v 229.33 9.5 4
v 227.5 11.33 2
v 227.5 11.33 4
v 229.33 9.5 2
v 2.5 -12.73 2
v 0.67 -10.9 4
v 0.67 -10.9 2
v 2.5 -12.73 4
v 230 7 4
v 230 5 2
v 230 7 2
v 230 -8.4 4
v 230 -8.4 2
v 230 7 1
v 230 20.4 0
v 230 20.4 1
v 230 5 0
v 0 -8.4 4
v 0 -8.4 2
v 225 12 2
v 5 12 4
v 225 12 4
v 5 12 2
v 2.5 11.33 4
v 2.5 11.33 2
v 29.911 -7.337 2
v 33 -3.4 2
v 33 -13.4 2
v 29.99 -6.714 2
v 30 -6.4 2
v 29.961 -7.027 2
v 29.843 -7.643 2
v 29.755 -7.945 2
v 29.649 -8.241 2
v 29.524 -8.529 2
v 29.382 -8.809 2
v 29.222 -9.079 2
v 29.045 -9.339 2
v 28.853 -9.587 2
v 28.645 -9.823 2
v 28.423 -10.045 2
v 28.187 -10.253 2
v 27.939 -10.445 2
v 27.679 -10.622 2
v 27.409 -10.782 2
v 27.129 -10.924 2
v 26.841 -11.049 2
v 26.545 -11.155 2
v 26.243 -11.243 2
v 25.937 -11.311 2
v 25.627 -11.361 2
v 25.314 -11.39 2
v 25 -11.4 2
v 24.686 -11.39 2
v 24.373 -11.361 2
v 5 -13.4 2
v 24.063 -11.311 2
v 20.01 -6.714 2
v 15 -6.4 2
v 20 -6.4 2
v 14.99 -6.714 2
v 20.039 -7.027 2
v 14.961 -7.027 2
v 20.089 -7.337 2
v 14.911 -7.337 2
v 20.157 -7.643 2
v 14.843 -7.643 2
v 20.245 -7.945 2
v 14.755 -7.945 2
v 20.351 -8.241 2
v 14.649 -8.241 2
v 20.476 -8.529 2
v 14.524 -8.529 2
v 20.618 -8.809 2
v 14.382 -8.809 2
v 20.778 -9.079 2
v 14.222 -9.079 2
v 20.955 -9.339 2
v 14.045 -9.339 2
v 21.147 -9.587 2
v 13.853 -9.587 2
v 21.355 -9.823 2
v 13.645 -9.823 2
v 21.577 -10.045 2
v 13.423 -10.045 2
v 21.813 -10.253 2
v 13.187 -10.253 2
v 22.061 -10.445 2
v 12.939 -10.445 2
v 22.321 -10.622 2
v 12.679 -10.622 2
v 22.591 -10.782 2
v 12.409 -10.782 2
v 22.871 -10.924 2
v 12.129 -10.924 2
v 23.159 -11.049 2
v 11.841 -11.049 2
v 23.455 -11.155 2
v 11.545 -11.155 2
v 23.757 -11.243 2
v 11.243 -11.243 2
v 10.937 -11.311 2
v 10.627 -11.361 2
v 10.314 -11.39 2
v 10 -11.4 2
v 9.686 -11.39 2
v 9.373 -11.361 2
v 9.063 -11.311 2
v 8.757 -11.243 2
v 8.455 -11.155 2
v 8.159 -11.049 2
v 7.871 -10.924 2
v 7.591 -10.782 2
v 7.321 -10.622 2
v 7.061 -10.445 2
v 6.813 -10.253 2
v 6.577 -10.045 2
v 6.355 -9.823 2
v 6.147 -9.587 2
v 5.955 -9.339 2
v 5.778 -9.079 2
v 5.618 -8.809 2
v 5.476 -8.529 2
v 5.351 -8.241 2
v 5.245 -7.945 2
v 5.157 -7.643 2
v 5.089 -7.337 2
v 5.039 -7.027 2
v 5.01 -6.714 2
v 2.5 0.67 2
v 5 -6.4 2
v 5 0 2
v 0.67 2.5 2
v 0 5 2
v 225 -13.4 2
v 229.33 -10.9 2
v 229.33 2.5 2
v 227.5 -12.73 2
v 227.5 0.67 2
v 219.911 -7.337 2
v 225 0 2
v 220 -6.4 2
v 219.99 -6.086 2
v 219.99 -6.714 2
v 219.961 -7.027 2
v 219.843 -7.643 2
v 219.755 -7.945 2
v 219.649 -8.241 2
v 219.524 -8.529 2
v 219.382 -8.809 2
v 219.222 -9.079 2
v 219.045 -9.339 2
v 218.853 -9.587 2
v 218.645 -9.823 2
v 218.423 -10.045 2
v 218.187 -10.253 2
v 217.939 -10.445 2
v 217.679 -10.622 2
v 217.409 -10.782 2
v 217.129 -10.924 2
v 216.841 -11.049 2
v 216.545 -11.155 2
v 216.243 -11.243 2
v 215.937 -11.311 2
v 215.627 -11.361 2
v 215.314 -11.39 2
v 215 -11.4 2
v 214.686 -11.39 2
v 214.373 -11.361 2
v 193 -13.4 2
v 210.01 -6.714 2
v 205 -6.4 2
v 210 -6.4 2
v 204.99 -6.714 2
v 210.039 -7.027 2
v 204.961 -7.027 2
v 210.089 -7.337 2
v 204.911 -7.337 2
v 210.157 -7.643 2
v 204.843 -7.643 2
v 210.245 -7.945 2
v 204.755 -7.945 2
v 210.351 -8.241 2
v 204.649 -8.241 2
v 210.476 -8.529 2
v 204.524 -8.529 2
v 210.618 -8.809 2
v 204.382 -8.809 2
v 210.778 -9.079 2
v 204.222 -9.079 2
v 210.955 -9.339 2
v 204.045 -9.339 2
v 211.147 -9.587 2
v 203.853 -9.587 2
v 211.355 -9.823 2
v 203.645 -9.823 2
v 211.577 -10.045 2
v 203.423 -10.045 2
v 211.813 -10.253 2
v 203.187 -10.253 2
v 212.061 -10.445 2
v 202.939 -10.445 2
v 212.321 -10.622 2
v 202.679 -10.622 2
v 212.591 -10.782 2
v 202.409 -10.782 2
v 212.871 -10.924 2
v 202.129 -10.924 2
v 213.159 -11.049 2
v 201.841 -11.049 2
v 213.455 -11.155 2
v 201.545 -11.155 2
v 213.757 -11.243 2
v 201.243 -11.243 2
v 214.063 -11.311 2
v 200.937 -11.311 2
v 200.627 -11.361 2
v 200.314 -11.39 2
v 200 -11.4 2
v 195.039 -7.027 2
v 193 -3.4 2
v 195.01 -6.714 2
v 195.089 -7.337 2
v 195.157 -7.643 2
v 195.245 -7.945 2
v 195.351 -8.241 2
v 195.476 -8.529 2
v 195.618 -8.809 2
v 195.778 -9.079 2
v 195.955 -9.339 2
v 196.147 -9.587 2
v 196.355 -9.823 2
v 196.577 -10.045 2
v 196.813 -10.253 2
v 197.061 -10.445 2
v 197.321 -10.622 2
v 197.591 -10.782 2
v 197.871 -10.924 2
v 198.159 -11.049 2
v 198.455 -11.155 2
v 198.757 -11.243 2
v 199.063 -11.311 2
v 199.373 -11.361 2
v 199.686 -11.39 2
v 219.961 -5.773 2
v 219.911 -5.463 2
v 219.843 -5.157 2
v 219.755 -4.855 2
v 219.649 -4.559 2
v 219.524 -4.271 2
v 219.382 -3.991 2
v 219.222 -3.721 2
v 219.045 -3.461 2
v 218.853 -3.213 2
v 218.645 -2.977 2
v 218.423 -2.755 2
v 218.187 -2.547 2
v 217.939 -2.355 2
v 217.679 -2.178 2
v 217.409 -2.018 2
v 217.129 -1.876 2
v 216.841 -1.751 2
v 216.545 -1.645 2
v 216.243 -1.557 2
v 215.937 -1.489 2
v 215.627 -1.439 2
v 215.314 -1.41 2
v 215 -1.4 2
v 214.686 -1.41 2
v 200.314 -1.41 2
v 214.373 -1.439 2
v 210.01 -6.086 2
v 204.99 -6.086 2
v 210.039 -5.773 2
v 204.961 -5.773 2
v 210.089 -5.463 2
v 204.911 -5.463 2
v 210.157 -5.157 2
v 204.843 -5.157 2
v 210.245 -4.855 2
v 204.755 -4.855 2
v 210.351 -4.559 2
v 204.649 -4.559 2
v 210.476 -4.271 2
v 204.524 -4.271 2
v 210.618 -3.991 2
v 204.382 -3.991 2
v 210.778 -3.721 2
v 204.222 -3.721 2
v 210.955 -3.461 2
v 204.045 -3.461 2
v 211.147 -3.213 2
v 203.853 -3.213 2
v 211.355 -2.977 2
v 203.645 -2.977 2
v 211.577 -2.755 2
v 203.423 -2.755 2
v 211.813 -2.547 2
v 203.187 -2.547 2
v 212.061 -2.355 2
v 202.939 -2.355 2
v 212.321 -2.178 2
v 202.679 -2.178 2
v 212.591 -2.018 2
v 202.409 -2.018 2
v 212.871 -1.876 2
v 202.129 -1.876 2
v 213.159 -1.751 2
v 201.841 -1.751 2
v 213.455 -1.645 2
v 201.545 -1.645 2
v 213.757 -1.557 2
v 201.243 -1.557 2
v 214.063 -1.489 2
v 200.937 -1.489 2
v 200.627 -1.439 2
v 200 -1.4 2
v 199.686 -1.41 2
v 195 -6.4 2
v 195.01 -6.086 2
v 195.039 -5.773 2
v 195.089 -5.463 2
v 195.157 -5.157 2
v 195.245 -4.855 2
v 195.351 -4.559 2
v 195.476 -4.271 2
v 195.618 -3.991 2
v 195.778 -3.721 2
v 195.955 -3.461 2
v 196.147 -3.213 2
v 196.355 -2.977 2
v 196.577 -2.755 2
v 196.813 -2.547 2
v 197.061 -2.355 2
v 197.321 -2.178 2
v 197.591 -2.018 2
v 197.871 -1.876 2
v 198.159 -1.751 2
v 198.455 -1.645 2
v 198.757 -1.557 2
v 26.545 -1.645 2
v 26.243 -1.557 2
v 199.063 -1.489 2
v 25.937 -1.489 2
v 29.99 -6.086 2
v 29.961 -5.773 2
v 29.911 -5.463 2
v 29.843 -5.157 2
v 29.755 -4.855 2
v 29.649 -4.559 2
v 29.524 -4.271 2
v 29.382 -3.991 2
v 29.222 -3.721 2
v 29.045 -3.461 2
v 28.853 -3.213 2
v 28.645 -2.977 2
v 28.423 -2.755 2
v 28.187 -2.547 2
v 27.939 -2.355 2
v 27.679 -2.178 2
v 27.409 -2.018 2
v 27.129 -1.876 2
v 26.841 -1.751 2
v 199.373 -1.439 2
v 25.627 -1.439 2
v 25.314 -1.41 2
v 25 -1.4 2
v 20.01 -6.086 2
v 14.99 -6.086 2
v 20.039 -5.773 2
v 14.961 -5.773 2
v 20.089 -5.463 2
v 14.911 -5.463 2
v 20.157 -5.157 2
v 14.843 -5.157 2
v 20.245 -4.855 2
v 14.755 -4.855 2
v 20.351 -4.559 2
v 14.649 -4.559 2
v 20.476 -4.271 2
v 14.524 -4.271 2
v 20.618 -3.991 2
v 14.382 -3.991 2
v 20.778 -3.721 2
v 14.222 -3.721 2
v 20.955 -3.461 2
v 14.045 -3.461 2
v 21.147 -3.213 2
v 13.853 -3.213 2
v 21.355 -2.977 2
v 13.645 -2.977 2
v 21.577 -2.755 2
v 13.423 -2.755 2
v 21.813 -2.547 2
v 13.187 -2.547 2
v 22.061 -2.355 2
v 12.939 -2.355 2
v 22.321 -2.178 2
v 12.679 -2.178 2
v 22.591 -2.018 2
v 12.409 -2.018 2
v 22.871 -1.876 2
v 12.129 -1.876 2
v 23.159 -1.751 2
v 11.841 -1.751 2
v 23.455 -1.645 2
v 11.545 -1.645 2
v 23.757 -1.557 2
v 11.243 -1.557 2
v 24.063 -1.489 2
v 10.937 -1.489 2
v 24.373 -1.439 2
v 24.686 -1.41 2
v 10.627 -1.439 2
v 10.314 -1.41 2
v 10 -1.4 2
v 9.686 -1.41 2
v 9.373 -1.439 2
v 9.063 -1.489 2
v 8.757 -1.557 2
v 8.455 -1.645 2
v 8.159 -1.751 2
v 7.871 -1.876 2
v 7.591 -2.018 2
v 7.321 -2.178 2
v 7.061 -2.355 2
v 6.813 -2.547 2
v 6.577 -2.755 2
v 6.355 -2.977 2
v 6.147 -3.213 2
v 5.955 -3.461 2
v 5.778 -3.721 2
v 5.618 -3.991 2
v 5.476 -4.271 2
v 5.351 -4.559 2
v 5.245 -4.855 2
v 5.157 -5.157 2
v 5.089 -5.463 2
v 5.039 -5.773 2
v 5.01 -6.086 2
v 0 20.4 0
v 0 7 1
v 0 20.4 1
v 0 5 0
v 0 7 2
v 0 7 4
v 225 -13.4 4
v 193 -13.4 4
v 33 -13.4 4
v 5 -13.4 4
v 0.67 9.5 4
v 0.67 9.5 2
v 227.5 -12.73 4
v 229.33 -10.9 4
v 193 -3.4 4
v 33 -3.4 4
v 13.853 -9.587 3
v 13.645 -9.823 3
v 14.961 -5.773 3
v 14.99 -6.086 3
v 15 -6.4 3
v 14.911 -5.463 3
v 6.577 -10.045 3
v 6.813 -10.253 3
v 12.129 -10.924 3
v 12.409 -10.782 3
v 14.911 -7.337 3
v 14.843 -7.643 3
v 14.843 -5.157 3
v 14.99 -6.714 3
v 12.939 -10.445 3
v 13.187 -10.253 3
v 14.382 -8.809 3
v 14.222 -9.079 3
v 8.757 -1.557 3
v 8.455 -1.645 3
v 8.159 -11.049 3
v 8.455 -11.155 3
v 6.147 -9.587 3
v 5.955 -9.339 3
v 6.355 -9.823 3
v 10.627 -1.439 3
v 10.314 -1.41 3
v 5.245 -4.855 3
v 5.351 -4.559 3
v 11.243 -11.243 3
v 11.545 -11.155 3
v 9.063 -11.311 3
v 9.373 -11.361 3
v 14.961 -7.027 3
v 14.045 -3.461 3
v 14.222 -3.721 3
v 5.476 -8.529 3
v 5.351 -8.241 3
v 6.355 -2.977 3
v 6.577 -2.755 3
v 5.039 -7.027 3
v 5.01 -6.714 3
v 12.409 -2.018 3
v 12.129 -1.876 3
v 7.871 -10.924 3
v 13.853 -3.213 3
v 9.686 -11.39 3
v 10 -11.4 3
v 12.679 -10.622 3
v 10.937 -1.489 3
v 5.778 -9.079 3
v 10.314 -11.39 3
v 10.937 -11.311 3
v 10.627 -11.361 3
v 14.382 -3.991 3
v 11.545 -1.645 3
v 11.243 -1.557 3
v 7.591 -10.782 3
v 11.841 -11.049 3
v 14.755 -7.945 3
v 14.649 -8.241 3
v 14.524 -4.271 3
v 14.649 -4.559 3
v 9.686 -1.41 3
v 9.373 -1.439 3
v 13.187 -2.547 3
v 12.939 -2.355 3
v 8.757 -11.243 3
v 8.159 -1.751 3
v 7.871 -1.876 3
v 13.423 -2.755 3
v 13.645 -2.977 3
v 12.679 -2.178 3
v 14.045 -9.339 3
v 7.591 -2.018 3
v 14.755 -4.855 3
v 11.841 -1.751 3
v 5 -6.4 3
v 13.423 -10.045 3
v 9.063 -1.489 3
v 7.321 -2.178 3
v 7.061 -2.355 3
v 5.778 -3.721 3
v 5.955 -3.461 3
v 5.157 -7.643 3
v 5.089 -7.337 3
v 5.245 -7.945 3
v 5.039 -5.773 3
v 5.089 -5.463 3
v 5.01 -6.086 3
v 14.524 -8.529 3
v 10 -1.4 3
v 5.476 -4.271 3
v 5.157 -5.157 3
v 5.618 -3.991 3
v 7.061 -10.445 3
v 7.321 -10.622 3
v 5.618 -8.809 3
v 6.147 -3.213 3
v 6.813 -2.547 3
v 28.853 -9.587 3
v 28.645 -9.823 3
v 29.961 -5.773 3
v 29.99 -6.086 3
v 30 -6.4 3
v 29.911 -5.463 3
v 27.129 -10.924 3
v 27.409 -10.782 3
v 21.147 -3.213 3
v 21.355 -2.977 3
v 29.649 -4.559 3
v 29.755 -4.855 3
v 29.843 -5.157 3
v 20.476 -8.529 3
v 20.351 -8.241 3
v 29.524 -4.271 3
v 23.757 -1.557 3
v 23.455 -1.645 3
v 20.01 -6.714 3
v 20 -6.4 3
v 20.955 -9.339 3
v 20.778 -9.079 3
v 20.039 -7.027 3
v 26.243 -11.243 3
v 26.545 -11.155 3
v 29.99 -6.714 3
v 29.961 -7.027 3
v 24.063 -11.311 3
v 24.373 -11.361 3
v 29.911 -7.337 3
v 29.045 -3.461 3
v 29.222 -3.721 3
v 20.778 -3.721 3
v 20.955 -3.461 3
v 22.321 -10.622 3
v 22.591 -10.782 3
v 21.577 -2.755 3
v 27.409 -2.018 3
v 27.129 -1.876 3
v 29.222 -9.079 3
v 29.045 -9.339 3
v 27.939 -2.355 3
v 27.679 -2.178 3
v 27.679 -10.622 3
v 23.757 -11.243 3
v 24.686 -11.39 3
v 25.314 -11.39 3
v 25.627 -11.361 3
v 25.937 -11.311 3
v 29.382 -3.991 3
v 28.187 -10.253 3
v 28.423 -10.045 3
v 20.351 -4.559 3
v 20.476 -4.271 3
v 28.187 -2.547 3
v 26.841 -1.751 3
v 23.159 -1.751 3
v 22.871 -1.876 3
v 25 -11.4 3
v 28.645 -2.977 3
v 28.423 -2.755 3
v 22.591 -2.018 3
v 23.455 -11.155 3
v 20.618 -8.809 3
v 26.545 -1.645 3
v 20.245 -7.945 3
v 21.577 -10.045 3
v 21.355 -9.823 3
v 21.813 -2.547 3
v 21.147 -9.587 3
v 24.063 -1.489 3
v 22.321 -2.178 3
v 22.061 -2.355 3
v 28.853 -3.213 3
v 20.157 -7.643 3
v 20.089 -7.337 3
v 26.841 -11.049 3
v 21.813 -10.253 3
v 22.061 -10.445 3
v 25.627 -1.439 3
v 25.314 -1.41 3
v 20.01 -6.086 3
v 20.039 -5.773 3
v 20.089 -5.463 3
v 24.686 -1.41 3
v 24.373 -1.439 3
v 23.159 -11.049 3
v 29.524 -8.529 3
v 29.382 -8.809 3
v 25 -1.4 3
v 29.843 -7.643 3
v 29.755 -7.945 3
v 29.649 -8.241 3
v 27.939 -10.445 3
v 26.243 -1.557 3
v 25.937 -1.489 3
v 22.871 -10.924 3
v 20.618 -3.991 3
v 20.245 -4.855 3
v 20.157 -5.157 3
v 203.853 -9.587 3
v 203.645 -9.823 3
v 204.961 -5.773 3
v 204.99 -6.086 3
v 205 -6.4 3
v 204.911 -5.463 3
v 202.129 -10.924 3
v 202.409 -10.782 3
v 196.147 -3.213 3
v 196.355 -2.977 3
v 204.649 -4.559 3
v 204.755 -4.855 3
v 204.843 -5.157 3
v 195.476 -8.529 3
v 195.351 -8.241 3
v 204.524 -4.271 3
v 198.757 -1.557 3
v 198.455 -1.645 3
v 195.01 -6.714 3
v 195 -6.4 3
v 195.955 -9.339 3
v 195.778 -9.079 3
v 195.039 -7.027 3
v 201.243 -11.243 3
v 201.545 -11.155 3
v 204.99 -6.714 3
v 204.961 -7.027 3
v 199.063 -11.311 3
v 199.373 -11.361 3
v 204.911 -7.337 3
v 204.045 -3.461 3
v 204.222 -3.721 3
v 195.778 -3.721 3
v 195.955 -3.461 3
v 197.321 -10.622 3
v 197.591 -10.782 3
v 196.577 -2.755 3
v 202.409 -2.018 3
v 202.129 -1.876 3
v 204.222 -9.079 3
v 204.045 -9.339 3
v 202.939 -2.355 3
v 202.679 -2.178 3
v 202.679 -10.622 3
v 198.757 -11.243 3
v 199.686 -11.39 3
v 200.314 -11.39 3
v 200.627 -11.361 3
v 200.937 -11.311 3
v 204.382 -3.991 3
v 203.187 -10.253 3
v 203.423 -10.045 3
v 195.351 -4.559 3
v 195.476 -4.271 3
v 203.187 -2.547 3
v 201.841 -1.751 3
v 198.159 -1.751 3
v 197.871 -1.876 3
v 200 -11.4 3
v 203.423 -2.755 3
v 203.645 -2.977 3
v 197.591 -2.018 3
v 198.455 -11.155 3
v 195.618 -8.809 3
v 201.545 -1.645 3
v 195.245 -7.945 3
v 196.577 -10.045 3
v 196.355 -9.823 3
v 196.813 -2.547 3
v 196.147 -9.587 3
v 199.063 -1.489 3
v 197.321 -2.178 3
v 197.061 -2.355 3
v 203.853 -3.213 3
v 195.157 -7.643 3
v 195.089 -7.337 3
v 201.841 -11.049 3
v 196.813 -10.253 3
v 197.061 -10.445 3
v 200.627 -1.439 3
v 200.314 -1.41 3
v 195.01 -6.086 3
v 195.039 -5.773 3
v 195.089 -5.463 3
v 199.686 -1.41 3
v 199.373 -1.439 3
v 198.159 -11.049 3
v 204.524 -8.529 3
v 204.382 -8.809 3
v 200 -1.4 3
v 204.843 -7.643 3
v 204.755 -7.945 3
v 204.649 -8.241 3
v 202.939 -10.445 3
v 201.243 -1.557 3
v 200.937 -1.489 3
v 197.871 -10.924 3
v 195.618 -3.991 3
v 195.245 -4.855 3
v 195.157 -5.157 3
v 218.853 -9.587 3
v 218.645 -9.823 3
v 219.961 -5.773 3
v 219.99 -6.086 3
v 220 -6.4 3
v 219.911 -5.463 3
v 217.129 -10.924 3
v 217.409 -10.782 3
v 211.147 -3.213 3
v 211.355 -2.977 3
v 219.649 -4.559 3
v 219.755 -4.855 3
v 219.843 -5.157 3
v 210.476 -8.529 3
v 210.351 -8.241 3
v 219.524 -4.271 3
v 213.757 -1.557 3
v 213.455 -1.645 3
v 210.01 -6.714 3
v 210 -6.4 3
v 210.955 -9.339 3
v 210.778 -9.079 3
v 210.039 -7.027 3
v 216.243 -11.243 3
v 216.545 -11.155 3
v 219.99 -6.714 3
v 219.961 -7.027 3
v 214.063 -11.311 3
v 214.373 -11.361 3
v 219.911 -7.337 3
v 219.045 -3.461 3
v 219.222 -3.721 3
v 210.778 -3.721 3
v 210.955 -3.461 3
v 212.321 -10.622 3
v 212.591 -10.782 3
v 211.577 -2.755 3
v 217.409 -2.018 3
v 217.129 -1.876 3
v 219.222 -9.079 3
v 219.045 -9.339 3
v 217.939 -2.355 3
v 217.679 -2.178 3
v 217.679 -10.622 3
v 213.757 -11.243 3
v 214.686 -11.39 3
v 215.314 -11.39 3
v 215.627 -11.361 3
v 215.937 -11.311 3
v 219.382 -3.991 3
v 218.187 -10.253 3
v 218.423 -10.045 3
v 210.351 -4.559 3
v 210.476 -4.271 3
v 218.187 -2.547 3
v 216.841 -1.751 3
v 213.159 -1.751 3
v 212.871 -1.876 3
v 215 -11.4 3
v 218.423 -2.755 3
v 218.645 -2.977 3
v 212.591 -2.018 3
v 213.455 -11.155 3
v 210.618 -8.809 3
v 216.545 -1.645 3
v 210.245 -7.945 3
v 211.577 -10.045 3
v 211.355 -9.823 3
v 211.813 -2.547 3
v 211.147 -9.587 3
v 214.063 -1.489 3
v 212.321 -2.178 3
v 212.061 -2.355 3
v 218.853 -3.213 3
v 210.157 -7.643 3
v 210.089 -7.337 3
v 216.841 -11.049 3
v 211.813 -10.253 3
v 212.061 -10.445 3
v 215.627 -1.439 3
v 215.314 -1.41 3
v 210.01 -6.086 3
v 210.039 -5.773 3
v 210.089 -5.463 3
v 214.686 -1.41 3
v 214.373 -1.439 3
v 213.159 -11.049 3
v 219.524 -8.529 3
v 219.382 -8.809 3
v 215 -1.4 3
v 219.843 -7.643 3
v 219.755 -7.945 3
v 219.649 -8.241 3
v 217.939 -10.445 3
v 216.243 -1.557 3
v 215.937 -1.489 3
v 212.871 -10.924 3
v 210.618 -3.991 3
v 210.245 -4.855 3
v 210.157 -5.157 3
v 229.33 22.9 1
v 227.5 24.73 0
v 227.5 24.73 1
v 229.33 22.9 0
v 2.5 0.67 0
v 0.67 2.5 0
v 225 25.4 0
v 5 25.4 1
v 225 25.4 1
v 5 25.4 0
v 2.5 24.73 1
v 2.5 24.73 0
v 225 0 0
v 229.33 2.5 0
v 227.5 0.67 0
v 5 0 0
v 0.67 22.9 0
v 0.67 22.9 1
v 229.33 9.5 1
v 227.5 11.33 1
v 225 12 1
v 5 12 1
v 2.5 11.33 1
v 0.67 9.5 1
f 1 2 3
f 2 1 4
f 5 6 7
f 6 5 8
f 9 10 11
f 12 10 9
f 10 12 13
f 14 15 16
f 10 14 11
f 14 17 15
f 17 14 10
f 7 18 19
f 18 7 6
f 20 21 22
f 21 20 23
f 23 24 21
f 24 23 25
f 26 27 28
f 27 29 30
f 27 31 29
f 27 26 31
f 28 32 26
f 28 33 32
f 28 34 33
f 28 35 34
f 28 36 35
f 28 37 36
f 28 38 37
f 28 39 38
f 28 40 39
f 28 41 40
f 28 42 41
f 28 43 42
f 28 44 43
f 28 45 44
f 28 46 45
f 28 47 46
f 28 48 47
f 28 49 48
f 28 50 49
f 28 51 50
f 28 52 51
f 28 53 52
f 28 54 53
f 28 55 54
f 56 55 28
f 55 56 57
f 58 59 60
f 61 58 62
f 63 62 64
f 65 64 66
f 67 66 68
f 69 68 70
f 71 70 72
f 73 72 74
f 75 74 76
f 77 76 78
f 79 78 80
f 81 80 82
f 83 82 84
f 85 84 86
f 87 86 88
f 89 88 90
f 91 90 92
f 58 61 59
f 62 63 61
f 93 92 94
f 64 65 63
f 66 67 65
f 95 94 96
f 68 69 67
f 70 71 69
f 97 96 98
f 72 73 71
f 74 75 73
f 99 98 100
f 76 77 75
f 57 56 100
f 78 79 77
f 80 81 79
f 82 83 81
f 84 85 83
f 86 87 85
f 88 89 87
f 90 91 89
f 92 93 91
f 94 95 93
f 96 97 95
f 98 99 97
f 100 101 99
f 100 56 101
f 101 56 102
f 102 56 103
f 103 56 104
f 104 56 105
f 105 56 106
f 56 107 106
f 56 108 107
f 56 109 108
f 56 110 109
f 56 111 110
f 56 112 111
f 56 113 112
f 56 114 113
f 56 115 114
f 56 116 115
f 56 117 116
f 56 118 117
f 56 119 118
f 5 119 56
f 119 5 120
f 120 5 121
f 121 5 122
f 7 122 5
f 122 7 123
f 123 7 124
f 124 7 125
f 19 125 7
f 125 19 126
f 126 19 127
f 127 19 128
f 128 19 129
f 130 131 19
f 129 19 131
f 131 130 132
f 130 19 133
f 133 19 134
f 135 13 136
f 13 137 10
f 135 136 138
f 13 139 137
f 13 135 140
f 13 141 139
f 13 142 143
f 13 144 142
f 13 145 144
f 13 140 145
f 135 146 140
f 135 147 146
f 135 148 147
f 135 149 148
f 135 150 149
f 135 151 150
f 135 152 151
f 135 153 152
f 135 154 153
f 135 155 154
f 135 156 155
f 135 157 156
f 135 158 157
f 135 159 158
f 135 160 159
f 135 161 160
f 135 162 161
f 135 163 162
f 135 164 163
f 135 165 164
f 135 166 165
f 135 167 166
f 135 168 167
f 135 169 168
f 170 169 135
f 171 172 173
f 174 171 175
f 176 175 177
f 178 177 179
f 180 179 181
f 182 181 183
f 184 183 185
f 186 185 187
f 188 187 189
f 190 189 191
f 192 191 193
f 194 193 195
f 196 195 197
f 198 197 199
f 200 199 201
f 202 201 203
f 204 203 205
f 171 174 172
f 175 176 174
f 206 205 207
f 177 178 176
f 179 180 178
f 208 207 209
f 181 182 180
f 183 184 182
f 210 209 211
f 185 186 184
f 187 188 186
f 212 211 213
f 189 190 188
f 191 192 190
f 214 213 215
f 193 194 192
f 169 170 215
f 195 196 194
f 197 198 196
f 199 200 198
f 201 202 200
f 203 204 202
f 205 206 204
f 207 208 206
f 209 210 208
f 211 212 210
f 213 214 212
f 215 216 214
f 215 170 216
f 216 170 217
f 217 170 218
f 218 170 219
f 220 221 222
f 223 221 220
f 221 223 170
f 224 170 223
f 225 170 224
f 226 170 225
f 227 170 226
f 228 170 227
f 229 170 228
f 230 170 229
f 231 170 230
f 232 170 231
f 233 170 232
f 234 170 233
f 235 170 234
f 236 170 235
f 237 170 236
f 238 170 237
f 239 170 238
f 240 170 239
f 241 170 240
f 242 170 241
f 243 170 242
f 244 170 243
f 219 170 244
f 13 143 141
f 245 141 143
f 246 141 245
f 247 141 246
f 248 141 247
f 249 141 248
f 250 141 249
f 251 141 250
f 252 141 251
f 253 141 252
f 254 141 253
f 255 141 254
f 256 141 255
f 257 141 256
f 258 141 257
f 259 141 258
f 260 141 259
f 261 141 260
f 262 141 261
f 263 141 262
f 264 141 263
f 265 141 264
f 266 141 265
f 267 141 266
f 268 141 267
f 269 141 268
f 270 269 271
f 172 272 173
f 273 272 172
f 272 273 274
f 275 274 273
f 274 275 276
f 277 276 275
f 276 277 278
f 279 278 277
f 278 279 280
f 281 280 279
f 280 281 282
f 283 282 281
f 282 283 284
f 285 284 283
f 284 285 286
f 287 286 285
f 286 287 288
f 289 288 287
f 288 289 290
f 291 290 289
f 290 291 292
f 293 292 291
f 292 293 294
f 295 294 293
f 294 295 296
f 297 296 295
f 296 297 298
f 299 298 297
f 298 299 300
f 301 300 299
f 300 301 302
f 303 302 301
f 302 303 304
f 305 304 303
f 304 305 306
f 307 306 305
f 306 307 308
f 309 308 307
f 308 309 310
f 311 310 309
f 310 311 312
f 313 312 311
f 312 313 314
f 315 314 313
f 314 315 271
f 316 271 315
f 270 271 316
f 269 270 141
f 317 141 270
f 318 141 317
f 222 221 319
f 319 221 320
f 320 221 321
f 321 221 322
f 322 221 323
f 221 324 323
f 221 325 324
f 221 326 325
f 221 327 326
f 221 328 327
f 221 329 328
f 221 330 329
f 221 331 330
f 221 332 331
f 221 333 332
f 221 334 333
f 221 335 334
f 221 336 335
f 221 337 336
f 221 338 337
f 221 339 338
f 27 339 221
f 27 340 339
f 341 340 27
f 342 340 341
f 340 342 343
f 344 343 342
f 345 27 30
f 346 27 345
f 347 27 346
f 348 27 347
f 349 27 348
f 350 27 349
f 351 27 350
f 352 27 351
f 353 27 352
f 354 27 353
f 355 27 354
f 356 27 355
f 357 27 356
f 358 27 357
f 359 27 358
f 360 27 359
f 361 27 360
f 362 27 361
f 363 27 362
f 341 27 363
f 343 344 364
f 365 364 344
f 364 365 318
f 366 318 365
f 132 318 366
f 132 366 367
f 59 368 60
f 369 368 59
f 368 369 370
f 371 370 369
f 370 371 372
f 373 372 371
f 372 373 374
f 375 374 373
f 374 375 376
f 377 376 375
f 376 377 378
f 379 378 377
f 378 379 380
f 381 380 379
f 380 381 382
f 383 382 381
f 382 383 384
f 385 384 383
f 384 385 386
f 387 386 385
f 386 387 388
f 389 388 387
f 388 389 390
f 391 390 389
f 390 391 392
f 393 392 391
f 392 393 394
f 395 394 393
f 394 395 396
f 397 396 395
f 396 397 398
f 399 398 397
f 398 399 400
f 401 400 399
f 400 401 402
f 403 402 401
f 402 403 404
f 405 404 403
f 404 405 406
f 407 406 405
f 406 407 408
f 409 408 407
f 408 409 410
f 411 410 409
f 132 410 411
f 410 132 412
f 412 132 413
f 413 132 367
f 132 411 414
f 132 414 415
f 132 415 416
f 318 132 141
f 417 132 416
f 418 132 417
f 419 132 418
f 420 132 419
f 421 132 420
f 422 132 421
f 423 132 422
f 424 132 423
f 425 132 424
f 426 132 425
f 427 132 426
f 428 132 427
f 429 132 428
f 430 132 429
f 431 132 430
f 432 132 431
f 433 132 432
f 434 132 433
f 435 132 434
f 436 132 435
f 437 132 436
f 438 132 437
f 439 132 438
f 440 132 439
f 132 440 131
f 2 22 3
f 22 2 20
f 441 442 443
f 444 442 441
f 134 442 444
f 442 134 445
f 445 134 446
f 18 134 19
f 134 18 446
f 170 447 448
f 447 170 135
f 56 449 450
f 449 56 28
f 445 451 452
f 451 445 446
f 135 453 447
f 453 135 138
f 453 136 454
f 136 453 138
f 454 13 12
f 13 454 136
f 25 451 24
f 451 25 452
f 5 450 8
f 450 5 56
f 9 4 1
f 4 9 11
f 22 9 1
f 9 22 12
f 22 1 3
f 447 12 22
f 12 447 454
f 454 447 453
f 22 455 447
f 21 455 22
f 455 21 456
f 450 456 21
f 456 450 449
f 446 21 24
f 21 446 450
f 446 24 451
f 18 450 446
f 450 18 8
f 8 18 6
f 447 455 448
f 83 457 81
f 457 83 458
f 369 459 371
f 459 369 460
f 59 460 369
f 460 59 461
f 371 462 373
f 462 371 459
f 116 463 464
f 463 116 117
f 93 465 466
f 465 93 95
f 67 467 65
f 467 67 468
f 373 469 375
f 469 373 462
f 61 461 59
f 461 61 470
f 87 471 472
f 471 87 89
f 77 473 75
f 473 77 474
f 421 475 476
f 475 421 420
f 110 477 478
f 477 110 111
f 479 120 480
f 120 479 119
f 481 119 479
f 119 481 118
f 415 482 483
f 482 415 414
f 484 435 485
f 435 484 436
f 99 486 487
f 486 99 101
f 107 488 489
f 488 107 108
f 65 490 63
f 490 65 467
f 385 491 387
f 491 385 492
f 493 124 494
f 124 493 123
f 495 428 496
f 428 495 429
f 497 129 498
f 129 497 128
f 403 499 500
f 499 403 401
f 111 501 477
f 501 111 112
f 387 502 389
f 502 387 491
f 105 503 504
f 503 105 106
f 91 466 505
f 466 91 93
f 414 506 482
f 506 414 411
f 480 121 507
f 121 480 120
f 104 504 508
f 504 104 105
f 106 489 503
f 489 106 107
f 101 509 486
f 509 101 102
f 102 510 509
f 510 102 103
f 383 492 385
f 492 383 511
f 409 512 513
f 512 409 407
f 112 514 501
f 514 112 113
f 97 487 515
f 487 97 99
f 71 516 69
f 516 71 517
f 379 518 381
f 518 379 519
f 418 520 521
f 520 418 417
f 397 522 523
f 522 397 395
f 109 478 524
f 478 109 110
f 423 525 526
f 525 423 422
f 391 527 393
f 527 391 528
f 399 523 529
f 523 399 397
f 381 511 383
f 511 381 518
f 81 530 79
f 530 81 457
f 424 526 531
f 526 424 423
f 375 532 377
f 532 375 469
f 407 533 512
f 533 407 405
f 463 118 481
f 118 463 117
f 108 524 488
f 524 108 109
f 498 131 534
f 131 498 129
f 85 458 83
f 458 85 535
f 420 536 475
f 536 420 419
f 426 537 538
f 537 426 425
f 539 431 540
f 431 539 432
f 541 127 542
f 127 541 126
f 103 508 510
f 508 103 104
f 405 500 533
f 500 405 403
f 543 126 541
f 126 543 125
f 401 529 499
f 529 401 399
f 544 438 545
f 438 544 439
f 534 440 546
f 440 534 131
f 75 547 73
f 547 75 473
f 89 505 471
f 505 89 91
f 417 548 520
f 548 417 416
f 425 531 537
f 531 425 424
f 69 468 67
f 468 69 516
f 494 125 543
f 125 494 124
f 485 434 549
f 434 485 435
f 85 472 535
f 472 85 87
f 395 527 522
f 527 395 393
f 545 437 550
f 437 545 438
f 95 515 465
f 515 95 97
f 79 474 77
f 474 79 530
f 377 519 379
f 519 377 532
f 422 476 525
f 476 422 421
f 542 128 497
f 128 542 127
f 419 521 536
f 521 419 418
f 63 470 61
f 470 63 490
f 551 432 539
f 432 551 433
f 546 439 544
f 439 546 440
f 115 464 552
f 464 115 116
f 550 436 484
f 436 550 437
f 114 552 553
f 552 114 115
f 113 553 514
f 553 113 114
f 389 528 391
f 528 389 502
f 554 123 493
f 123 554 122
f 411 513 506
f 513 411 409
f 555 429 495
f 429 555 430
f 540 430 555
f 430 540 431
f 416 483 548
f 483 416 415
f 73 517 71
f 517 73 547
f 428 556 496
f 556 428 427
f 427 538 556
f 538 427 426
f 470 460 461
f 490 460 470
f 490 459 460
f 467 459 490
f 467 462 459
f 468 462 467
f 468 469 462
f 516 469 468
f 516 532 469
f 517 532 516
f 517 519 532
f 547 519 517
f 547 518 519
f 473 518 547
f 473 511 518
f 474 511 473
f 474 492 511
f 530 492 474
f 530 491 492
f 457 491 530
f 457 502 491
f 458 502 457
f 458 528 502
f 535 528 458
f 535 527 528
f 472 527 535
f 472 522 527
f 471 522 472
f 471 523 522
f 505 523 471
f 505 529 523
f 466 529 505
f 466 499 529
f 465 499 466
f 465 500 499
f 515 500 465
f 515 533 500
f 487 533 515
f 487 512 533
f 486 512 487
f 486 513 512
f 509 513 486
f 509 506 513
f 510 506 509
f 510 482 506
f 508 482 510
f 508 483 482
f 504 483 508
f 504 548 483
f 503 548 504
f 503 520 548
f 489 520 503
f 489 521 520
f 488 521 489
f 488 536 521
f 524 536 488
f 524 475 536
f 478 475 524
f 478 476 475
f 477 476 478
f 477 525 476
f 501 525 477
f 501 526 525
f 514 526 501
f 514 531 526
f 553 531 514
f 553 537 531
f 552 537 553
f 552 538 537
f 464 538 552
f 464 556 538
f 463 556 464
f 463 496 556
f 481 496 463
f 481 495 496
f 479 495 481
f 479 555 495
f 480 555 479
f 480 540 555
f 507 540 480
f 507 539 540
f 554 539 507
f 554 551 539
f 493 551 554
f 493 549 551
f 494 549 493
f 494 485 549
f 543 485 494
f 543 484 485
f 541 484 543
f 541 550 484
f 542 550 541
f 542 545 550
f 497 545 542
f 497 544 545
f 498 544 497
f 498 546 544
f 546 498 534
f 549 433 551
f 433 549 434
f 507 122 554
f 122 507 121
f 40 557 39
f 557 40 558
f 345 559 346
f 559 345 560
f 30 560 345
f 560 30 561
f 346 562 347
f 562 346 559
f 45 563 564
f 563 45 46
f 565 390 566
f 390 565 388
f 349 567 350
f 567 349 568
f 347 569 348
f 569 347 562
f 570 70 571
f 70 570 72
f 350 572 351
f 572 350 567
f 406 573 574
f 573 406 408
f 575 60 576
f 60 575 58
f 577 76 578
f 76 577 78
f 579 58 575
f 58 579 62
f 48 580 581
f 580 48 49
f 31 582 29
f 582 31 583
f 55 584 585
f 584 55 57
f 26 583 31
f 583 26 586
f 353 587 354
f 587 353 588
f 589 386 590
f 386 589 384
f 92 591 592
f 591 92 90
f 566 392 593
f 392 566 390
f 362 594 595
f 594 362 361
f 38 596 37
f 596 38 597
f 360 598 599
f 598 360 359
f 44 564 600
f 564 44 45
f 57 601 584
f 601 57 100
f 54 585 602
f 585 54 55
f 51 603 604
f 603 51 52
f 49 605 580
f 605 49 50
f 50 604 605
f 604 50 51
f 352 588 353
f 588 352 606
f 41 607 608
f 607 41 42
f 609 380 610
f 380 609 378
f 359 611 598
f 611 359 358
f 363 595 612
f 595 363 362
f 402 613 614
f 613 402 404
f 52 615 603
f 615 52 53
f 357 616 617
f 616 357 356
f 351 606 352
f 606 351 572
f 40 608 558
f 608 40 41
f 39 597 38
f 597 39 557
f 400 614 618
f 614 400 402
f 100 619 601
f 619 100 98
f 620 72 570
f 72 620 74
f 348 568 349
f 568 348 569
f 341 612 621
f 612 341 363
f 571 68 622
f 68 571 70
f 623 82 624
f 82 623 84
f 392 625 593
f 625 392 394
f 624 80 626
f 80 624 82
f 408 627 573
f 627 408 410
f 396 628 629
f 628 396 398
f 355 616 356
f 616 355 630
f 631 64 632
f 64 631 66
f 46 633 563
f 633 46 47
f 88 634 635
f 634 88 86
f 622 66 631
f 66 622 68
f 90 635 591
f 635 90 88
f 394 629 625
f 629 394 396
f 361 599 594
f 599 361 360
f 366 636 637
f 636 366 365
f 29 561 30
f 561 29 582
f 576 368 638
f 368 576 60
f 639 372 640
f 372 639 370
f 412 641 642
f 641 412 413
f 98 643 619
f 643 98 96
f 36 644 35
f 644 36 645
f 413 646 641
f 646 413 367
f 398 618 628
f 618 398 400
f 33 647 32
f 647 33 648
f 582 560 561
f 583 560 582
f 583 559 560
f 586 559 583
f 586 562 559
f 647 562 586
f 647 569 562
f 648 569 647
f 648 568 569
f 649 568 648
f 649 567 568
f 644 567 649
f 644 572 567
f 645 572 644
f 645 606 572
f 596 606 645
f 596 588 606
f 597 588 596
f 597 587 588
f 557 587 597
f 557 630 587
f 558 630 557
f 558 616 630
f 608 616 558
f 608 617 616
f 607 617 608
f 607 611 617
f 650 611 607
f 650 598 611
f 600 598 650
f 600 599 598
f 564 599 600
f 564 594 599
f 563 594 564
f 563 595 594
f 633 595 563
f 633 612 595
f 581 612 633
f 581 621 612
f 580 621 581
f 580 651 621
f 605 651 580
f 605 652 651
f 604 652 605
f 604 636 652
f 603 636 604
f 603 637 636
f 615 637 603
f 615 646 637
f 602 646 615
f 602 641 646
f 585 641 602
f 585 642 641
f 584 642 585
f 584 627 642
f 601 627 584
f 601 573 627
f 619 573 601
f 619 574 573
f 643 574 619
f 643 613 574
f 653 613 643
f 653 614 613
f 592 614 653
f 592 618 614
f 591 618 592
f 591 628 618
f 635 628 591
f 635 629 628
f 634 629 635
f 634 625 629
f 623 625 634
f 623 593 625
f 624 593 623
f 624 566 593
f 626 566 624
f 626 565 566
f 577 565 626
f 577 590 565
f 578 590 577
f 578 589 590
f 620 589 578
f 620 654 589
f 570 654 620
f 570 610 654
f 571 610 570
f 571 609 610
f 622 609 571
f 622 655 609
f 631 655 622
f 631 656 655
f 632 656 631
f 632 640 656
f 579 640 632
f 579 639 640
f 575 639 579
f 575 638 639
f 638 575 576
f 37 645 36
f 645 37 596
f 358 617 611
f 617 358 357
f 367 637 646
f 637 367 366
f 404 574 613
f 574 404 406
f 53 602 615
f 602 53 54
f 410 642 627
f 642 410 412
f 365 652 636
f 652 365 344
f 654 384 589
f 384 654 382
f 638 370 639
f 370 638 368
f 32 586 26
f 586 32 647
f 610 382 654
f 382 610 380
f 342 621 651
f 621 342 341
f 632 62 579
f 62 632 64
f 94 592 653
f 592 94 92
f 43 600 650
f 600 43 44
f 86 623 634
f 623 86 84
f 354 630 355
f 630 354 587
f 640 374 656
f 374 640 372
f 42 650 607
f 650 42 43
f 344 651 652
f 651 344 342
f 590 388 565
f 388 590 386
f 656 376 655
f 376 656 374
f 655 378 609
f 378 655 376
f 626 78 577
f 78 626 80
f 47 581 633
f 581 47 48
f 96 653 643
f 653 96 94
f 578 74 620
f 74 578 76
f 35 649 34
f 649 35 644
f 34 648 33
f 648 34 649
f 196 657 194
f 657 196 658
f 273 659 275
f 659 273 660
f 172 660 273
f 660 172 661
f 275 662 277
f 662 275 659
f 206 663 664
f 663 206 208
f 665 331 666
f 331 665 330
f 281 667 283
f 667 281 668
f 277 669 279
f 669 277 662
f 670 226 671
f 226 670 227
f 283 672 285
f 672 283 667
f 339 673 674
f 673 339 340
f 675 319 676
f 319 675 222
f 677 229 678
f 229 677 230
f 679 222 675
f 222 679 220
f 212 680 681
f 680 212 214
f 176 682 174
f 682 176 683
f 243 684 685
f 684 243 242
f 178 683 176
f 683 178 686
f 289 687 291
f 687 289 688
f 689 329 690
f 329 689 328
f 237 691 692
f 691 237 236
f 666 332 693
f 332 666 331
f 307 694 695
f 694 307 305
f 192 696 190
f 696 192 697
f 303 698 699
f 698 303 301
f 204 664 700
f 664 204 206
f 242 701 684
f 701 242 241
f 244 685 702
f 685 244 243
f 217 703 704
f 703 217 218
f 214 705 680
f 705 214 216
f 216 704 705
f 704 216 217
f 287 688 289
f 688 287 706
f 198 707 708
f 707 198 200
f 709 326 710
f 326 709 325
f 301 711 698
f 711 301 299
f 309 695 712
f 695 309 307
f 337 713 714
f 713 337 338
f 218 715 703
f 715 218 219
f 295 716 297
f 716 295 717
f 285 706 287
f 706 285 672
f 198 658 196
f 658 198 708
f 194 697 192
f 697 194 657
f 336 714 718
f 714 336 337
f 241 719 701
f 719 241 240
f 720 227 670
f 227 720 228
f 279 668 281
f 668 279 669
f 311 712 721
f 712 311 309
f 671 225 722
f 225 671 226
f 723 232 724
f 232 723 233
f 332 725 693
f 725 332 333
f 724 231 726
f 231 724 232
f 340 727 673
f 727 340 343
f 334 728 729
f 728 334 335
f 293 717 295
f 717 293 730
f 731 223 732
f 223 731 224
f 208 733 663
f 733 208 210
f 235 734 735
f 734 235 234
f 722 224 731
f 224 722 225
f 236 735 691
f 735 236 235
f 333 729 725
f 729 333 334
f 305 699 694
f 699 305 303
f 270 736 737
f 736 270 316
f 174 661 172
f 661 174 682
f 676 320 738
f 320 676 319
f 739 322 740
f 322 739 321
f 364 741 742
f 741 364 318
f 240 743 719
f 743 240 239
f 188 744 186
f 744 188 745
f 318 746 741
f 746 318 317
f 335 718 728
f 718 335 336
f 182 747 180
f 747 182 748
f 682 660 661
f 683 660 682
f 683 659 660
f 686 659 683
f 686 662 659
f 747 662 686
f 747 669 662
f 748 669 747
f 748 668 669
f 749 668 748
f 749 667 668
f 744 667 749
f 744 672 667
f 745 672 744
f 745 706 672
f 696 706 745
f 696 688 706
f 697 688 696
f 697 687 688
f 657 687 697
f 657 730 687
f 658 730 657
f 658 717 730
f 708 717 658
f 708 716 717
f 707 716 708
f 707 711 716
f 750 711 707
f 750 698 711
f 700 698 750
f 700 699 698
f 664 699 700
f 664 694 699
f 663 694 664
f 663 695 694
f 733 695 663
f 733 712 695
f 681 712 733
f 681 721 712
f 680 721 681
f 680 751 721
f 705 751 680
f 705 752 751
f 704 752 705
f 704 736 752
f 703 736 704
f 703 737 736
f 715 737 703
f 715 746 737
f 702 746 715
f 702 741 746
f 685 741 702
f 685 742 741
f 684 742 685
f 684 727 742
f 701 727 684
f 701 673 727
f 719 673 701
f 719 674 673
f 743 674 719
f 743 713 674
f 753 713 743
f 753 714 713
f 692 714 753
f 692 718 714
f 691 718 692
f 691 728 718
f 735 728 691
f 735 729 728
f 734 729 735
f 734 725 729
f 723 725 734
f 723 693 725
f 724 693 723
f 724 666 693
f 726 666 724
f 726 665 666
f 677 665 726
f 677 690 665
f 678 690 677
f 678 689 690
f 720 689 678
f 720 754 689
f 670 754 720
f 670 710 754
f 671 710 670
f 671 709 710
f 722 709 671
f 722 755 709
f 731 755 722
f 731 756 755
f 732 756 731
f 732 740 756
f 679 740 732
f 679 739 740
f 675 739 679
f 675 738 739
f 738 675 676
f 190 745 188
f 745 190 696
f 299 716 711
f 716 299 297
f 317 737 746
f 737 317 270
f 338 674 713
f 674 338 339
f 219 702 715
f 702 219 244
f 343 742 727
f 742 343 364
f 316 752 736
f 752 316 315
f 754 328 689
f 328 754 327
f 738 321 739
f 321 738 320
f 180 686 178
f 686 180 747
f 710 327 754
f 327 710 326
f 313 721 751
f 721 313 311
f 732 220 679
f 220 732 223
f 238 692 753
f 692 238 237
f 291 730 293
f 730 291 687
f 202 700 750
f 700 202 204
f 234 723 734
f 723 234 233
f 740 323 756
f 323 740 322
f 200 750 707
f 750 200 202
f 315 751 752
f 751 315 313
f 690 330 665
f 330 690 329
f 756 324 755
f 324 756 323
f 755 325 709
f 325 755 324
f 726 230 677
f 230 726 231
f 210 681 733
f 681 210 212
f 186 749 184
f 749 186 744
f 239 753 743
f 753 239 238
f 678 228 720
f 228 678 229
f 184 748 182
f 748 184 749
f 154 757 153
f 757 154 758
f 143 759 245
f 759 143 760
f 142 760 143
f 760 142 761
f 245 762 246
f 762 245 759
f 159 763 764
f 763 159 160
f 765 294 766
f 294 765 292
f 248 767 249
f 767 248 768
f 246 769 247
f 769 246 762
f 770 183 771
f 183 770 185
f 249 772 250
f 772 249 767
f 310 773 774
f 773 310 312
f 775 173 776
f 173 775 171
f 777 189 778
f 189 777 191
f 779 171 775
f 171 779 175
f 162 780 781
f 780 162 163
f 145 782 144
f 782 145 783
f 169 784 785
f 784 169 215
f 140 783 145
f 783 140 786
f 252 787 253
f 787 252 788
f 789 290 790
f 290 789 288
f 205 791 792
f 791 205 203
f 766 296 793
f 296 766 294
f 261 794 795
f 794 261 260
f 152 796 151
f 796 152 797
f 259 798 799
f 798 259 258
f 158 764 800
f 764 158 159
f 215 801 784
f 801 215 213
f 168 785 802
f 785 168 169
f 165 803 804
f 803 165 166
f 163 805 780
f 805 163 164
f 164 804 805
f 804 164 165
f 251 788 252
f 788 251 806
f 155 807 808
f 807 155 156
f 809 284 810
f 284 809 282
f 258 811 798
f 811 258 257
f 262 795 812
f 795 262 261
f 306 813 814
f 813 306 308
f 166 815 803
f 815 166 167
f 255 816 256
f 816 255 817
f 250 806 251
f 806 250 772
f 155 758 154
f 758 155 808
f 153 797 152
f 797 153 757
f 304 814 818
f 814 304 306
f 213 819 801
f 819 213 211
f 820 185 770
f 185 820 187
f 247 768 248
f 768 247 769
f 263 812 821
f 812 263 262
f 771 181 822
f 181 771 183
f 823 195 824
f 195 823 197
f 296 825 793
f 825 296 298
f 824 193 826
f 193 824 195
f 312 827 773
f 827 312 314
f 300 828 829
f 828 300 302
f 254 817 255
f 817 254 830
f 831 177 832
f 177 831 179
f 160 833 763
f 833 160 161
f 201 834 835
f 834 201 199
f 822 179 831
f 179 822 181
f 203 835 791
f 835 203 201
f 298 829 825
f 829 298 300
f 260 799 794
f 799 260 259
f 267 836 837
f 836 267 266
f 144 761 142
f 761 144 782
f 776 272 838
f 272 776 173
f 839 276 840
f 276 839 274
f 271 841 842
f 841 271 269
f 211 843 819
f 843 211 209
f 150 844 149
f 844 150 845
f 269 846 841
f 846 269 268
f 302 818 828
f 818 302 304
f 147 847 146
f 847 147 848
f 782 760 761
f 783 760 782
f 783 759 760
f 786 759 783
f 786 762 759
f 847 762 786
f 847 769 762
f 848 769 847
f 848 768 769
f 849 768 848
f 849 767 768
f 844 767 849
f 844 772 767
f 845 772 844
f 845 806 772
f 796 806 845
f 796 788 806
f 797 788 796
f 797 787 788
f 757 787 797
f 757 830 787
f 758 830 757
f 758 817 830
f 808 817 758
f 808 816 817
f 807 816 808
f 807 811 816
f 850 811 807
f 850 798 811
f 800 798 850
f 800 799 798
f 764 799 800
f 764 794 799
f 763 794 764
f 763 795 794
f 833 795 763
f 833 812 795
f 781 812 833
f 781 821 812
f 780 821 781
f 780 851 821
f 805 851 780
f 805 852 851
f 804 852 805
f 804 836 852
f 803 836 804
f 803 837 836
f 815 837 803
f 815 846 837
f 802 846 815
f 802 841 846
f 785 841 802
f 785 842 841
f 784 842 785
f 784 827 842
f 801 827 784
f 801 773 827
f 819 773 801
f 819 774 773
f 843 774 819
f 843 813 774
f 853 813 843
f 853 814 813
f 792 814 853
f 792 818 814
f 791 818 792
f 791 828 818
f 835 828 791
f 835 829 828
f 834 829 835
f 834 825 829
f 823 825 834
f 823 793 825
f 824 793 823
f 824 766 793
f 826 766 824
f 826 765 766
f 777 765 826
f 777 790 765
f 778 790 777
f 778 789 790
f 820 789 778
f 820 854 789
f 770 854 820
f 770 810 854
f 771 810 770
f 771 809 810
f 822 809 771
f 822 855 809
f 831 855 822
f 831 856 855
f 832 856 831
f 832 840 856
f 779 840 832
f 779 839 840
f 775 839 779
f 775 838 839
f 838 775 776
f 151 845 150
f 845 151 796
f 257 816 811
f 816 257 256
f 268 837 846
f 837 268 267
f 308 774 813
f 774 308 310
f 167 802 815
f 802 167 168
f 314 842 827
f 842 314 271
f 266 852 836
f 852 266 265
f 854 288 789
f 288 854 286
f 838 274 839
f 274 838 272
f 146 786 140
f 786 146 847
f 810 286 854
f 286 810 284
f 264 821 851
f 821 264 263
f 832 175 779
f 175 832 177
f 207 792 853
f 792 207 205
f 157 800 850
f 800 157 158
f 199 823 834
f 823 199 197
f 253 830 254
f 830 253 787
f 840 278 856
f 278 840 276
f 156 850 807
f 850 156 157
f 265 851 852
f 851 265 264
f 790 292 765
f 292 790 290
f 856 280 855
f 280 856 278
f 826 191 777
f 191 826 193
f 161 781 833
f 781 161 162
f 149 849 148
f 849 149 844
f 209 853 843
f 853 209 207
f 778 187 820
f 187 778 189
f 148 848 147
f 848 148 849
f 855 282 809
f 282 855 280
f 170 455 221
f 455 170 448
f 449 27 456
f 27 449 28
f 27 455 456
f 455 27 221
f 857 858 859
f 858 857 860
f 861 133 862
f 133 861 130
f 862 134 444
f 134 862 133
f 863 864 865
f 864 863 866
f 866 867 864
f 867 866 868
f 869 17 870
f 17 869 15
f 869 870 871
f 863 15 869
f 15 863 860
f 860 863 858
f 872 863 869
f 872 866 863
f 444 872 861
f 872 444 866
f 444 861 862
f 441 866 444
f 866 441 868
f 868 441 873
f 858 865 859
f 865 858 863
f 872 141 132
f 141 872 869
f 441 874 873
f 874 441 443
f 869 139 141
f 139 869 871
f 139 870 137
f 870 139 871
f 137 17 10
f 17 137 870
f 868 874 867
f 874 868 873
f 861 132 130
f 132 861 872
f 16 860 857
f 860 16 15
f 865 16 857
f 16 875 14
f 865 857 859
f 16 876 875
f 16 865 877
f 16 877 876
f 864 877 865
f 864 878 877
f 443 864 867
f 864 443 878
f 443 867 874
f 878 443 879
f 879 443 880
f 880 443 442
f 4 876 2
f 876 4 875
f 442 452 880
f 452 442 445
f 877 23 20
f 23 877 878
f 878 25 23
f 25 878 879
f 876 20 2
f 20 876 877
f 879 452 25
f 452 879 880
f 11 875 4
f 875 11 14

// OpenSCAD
$fn = 100;
// The height of the Acrylic used for the keyguard
acrylicHeight = 3;

roundedRect([230, 25.4, 1], 5, $fn=12);
roundedRect([230, 12, acrylicHeight-1], 5, $fn=12);

translate([0,-13.4,acrylicHeight-1]){
	difference(){
    difference(){
        roundedRect([230, 25.4, 2], 5, $fn=12);
        translate ([10,7,-1]){
            cylinder(h=2,r=5);
        }
        translate ([25,7,-1]){
            cylinder(h=2,r=5);
        }

	   translate ([200,7,-1]){
            cylinder(h=2,r=5);
        }
        translate ([215,7,-1]){
            cylinder(h=2,r=5);
        }
    }
	translate([33,0,0]) cube([160, 10, 3]);
}

}




module roundedRect(size, radius) {
x = size[0];
y = size[1];
z = size[2];

linear_extrude(height=z)
hull() {
translate([radius, radius, 0])
circle(r=radius);

translate([x - radius, radius, 0])
circle(r=radius);

translate([x - radius, y - radius, 0])
circle(r=radius);

translate([radius, y - radius, 0])
circle(r=radius);
}
}
